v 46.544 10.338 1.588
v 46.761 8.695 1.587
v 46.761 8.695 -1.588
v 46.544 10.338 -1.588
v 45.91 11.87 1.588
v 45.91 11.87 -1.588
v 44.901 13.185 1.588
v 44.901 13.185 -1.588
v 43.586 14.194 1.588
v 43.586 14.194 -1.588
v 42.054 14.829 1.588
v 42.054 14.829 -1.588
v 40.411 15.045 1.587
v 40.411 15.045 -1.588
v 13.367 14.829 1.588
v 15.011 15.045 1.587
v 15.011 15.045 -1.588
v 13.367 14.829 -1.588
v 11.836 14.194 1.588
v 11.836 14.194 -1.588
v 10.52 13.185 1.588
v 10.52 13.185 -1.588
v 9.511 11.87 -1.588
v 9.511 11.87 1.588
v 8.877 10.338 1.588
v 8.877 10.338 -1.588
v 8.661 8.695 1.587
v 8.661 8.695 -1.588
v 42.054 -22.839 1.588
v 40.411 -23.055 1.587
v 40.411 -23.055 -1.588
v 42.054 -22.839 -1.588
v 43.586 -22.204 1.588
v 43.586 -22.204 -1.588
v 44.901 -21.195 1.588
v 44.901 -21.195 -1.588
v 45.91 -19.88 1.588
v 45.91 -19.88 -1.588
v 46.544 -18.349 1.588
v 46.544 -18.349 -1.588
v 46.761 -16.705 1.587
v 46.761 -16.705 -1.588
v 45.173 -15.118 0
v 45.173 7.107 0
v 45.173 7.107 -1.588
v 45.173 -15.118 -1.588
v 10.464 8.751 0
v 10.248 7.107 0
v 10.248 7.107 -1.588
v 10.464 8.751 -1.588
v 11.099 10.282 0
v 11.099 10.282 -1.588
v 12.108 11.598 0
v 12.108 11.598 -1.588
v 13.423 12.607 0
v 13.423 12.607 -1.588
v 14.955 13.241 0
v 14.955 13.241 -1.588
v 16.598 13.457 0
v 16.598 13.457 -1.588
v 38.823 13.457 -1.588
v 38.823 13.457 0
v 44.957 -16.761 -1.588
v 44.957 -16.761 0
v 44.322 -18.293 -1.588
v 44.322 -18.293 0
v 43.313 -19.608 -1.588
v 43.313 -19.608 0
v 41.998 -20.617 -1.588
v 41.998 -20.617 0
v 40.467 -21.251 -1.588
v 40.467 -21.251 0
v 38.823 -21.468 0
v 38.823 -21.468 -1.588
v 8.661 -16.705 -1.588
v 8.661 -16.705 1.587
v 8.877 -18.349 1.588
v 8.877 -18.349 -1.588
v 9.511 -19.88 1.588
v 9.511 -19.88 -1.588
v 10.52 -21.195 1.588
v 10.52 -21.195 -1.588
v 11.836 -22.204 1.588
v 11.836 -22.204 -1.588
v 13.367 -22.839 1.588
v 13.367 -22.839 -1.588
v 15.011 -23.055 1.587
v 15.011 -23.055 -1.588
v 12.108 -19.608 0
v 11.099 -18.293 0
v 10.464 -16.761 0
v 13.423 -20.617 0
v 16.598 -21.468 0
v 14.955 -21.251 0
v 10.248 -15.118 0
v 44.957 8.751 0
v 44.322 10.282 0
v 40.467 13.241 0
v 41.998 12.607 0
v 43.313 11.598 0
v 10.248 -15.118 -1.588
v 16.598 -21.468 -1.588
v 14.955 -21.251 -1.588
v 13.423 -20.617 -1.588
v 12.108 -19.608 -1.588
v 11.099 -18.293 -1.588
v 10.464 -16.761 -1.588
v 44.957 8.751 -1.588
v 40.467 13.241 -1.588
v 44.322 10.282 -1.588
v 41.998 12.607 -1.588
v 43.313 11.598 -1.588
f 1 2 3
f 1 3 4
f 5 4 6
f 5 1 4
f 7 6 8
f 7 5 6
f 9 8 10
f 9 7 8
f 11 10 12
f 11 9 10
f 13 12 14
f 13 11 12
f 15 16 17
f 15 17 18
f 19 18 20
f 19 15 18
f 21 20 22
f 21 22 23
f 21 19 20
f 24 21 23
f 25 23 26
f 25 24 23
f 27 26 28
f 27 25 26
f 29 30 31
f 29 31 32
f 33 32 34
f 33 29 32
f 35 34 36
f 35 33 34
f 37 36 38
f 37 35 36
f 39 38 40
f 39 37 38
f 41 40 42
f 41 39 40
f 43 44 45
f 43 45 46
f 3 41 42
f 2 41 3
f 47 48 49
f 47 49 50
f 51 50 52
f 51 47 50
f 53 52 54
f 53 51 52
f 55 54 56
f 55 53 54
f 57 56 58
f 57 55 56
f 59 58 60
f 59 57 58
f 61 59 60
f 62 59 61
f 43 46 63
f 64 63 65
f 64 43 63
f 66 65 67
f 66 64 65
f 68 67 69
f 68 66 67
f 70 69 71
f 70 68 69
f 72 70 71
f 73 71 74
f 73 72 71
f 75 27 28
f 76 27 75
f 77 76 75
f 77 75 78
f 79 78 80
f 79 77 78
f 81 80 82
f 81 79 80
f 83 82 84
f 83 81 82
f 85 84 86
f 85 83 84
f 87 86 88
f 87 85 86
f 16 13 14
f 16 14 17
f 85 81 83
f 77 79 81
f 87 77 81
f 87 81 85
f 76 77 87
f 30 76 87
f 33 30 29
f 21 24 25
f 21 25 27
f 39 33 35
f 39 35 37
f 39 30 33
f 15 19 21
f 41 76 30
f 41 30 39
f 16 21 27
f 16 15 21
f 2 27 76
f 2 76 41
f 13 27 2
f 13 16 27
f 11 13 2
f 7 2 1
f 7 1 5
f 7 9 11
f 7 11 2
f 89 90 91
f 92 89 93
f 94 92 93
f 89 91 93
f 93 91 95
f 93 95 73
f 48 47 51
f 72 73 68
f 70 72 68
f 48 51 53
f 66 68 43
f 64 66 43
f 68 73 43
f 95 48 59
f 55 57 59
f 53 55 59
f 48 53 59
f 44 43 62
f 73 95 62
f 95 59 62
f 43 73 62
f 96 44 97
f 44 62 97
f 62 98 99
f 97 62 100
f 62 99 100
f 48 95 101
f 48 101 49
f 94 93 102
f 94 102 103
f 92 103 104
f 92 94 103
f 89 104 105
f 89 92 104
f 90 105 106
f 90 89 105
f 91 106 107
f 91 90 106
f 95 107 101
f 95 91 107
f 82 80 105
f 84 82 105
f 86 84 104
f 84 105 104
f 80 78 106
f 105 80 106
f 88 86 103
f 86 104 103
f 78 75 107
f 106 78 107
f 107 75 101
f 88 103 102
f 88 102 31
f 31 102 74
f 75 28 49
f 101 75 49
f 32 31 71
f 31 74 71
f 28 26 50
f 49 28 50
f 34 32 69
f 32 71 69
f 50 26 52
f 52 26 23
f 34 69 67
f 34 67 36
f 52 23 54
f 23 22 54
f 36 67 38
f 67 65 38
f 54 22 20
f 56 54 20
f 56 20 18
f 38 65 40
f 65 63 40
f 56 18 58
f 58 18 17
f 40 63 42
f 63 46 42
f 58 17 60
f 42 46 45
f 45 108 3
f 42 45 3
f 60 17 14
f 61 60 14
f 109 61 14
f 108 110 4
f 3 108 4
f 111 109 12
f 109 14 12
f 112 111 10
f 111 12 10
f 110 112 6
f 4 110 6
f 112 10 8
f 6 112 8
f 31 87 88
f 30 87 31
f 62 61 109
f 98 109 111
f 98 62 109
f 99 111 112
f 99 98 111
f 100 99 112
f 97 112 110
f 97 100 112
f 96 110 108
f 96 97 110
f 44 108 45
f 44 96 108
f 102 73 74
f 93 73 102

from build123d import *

# Parameters (mm, degrees)
F1_DEPTH = 1.5875
F3_DEPTH = 3.175


with BuildPart() as f1:
    # F0 (on Top) → F1 (new body)
    with BuildSketch(Plane.XY):
        with BuildLine():
            Line((40.410568, 15.044903), (15.010568, 15.044903))
            ThreePointArc((15.010568, 15.044903), (10.52044, 13.185031), (8.660568, 8.694903))
            Line((8.660568, 8.694903), (8.660568, -16.705097))
            ThreePointArc((8.660568, -16.705097), (10.52044, -21.195225), (15.010568, -23.055097))
            Line((15.010568, -23.055097), (40.410568, -23.055097))
            ThreePointArc((40.410568, -23.055097), (44.900696, -21.195225), (46.760568, -16.705097))
            Line((46.760568, -16.705097), (46.760568, 8.694903))
            ThreePointArc((46.760568, 8.694903), (44.900696, 13.185031), (40.410568, 15.044903))
        make_face()
    extrude(amount=F1_DEPTH)

    # F2 (on face) → F3 (join)
    with BuildSketch(Plane.XY.offset(1.5875)):
        with BuildLine():
            ThreePointArc((46.760568, 8.694903), (44.900696, 13.185031), (40.410568, 15.044903))
            Line((40.410568, 15.044903), (15.010568, 15.044903))
            ThreePointArc((15.010568, 15.044903), (10.52044, 13.185031), (8.660568, 8.694903))
            Line((8.660568, 8.694903), (8.660568, -16.705097))
            ThreePointArc((8.660568, -16.705097), (10.52044, -21.195225), (15.010568, -23.055097))
            Line((15.010568, -23.055097), (40.410568, -23.055097))
            ThreePointArc((40.410568, -23.055097), (44.900696, -21.195225), (46.760568, -16.705097))
            Line((46.760568, -16.705097), (46.760568, 8.694903))
        make_face()
        with BuildLine():
            ThreePointArc((10.248068, 7.107403), (12.10794, 11.597531), (16.598068, 13.457403))
            Line((16.598068, 13.457403), (38.823068, 13.457403))
            ThreePointArc((38.823068, 13.457403), (43.313196, 11.597531), (45.173068, 7.107403))
            Line((45.173068, 7.107403), (45.173068, -15.117597))
            ThreePointArc((45.173068, -15.117597), (43.313196, -19.607725), (38.823068, -21.467597))
            Line((38.823068, -21.467597), (16.598068, -21.467597))
            ThreePointArc((16.598068, -21.467597), (12.10794, -19.607725), (10.248068, -15.117597))
            Line((10.248068, -15.117597), (10.248068, 7.107403))
        make_face(mode=Mode.SUBTRACT)
    extrude(amount=-F3_DEPTH)


solid = f1.part
